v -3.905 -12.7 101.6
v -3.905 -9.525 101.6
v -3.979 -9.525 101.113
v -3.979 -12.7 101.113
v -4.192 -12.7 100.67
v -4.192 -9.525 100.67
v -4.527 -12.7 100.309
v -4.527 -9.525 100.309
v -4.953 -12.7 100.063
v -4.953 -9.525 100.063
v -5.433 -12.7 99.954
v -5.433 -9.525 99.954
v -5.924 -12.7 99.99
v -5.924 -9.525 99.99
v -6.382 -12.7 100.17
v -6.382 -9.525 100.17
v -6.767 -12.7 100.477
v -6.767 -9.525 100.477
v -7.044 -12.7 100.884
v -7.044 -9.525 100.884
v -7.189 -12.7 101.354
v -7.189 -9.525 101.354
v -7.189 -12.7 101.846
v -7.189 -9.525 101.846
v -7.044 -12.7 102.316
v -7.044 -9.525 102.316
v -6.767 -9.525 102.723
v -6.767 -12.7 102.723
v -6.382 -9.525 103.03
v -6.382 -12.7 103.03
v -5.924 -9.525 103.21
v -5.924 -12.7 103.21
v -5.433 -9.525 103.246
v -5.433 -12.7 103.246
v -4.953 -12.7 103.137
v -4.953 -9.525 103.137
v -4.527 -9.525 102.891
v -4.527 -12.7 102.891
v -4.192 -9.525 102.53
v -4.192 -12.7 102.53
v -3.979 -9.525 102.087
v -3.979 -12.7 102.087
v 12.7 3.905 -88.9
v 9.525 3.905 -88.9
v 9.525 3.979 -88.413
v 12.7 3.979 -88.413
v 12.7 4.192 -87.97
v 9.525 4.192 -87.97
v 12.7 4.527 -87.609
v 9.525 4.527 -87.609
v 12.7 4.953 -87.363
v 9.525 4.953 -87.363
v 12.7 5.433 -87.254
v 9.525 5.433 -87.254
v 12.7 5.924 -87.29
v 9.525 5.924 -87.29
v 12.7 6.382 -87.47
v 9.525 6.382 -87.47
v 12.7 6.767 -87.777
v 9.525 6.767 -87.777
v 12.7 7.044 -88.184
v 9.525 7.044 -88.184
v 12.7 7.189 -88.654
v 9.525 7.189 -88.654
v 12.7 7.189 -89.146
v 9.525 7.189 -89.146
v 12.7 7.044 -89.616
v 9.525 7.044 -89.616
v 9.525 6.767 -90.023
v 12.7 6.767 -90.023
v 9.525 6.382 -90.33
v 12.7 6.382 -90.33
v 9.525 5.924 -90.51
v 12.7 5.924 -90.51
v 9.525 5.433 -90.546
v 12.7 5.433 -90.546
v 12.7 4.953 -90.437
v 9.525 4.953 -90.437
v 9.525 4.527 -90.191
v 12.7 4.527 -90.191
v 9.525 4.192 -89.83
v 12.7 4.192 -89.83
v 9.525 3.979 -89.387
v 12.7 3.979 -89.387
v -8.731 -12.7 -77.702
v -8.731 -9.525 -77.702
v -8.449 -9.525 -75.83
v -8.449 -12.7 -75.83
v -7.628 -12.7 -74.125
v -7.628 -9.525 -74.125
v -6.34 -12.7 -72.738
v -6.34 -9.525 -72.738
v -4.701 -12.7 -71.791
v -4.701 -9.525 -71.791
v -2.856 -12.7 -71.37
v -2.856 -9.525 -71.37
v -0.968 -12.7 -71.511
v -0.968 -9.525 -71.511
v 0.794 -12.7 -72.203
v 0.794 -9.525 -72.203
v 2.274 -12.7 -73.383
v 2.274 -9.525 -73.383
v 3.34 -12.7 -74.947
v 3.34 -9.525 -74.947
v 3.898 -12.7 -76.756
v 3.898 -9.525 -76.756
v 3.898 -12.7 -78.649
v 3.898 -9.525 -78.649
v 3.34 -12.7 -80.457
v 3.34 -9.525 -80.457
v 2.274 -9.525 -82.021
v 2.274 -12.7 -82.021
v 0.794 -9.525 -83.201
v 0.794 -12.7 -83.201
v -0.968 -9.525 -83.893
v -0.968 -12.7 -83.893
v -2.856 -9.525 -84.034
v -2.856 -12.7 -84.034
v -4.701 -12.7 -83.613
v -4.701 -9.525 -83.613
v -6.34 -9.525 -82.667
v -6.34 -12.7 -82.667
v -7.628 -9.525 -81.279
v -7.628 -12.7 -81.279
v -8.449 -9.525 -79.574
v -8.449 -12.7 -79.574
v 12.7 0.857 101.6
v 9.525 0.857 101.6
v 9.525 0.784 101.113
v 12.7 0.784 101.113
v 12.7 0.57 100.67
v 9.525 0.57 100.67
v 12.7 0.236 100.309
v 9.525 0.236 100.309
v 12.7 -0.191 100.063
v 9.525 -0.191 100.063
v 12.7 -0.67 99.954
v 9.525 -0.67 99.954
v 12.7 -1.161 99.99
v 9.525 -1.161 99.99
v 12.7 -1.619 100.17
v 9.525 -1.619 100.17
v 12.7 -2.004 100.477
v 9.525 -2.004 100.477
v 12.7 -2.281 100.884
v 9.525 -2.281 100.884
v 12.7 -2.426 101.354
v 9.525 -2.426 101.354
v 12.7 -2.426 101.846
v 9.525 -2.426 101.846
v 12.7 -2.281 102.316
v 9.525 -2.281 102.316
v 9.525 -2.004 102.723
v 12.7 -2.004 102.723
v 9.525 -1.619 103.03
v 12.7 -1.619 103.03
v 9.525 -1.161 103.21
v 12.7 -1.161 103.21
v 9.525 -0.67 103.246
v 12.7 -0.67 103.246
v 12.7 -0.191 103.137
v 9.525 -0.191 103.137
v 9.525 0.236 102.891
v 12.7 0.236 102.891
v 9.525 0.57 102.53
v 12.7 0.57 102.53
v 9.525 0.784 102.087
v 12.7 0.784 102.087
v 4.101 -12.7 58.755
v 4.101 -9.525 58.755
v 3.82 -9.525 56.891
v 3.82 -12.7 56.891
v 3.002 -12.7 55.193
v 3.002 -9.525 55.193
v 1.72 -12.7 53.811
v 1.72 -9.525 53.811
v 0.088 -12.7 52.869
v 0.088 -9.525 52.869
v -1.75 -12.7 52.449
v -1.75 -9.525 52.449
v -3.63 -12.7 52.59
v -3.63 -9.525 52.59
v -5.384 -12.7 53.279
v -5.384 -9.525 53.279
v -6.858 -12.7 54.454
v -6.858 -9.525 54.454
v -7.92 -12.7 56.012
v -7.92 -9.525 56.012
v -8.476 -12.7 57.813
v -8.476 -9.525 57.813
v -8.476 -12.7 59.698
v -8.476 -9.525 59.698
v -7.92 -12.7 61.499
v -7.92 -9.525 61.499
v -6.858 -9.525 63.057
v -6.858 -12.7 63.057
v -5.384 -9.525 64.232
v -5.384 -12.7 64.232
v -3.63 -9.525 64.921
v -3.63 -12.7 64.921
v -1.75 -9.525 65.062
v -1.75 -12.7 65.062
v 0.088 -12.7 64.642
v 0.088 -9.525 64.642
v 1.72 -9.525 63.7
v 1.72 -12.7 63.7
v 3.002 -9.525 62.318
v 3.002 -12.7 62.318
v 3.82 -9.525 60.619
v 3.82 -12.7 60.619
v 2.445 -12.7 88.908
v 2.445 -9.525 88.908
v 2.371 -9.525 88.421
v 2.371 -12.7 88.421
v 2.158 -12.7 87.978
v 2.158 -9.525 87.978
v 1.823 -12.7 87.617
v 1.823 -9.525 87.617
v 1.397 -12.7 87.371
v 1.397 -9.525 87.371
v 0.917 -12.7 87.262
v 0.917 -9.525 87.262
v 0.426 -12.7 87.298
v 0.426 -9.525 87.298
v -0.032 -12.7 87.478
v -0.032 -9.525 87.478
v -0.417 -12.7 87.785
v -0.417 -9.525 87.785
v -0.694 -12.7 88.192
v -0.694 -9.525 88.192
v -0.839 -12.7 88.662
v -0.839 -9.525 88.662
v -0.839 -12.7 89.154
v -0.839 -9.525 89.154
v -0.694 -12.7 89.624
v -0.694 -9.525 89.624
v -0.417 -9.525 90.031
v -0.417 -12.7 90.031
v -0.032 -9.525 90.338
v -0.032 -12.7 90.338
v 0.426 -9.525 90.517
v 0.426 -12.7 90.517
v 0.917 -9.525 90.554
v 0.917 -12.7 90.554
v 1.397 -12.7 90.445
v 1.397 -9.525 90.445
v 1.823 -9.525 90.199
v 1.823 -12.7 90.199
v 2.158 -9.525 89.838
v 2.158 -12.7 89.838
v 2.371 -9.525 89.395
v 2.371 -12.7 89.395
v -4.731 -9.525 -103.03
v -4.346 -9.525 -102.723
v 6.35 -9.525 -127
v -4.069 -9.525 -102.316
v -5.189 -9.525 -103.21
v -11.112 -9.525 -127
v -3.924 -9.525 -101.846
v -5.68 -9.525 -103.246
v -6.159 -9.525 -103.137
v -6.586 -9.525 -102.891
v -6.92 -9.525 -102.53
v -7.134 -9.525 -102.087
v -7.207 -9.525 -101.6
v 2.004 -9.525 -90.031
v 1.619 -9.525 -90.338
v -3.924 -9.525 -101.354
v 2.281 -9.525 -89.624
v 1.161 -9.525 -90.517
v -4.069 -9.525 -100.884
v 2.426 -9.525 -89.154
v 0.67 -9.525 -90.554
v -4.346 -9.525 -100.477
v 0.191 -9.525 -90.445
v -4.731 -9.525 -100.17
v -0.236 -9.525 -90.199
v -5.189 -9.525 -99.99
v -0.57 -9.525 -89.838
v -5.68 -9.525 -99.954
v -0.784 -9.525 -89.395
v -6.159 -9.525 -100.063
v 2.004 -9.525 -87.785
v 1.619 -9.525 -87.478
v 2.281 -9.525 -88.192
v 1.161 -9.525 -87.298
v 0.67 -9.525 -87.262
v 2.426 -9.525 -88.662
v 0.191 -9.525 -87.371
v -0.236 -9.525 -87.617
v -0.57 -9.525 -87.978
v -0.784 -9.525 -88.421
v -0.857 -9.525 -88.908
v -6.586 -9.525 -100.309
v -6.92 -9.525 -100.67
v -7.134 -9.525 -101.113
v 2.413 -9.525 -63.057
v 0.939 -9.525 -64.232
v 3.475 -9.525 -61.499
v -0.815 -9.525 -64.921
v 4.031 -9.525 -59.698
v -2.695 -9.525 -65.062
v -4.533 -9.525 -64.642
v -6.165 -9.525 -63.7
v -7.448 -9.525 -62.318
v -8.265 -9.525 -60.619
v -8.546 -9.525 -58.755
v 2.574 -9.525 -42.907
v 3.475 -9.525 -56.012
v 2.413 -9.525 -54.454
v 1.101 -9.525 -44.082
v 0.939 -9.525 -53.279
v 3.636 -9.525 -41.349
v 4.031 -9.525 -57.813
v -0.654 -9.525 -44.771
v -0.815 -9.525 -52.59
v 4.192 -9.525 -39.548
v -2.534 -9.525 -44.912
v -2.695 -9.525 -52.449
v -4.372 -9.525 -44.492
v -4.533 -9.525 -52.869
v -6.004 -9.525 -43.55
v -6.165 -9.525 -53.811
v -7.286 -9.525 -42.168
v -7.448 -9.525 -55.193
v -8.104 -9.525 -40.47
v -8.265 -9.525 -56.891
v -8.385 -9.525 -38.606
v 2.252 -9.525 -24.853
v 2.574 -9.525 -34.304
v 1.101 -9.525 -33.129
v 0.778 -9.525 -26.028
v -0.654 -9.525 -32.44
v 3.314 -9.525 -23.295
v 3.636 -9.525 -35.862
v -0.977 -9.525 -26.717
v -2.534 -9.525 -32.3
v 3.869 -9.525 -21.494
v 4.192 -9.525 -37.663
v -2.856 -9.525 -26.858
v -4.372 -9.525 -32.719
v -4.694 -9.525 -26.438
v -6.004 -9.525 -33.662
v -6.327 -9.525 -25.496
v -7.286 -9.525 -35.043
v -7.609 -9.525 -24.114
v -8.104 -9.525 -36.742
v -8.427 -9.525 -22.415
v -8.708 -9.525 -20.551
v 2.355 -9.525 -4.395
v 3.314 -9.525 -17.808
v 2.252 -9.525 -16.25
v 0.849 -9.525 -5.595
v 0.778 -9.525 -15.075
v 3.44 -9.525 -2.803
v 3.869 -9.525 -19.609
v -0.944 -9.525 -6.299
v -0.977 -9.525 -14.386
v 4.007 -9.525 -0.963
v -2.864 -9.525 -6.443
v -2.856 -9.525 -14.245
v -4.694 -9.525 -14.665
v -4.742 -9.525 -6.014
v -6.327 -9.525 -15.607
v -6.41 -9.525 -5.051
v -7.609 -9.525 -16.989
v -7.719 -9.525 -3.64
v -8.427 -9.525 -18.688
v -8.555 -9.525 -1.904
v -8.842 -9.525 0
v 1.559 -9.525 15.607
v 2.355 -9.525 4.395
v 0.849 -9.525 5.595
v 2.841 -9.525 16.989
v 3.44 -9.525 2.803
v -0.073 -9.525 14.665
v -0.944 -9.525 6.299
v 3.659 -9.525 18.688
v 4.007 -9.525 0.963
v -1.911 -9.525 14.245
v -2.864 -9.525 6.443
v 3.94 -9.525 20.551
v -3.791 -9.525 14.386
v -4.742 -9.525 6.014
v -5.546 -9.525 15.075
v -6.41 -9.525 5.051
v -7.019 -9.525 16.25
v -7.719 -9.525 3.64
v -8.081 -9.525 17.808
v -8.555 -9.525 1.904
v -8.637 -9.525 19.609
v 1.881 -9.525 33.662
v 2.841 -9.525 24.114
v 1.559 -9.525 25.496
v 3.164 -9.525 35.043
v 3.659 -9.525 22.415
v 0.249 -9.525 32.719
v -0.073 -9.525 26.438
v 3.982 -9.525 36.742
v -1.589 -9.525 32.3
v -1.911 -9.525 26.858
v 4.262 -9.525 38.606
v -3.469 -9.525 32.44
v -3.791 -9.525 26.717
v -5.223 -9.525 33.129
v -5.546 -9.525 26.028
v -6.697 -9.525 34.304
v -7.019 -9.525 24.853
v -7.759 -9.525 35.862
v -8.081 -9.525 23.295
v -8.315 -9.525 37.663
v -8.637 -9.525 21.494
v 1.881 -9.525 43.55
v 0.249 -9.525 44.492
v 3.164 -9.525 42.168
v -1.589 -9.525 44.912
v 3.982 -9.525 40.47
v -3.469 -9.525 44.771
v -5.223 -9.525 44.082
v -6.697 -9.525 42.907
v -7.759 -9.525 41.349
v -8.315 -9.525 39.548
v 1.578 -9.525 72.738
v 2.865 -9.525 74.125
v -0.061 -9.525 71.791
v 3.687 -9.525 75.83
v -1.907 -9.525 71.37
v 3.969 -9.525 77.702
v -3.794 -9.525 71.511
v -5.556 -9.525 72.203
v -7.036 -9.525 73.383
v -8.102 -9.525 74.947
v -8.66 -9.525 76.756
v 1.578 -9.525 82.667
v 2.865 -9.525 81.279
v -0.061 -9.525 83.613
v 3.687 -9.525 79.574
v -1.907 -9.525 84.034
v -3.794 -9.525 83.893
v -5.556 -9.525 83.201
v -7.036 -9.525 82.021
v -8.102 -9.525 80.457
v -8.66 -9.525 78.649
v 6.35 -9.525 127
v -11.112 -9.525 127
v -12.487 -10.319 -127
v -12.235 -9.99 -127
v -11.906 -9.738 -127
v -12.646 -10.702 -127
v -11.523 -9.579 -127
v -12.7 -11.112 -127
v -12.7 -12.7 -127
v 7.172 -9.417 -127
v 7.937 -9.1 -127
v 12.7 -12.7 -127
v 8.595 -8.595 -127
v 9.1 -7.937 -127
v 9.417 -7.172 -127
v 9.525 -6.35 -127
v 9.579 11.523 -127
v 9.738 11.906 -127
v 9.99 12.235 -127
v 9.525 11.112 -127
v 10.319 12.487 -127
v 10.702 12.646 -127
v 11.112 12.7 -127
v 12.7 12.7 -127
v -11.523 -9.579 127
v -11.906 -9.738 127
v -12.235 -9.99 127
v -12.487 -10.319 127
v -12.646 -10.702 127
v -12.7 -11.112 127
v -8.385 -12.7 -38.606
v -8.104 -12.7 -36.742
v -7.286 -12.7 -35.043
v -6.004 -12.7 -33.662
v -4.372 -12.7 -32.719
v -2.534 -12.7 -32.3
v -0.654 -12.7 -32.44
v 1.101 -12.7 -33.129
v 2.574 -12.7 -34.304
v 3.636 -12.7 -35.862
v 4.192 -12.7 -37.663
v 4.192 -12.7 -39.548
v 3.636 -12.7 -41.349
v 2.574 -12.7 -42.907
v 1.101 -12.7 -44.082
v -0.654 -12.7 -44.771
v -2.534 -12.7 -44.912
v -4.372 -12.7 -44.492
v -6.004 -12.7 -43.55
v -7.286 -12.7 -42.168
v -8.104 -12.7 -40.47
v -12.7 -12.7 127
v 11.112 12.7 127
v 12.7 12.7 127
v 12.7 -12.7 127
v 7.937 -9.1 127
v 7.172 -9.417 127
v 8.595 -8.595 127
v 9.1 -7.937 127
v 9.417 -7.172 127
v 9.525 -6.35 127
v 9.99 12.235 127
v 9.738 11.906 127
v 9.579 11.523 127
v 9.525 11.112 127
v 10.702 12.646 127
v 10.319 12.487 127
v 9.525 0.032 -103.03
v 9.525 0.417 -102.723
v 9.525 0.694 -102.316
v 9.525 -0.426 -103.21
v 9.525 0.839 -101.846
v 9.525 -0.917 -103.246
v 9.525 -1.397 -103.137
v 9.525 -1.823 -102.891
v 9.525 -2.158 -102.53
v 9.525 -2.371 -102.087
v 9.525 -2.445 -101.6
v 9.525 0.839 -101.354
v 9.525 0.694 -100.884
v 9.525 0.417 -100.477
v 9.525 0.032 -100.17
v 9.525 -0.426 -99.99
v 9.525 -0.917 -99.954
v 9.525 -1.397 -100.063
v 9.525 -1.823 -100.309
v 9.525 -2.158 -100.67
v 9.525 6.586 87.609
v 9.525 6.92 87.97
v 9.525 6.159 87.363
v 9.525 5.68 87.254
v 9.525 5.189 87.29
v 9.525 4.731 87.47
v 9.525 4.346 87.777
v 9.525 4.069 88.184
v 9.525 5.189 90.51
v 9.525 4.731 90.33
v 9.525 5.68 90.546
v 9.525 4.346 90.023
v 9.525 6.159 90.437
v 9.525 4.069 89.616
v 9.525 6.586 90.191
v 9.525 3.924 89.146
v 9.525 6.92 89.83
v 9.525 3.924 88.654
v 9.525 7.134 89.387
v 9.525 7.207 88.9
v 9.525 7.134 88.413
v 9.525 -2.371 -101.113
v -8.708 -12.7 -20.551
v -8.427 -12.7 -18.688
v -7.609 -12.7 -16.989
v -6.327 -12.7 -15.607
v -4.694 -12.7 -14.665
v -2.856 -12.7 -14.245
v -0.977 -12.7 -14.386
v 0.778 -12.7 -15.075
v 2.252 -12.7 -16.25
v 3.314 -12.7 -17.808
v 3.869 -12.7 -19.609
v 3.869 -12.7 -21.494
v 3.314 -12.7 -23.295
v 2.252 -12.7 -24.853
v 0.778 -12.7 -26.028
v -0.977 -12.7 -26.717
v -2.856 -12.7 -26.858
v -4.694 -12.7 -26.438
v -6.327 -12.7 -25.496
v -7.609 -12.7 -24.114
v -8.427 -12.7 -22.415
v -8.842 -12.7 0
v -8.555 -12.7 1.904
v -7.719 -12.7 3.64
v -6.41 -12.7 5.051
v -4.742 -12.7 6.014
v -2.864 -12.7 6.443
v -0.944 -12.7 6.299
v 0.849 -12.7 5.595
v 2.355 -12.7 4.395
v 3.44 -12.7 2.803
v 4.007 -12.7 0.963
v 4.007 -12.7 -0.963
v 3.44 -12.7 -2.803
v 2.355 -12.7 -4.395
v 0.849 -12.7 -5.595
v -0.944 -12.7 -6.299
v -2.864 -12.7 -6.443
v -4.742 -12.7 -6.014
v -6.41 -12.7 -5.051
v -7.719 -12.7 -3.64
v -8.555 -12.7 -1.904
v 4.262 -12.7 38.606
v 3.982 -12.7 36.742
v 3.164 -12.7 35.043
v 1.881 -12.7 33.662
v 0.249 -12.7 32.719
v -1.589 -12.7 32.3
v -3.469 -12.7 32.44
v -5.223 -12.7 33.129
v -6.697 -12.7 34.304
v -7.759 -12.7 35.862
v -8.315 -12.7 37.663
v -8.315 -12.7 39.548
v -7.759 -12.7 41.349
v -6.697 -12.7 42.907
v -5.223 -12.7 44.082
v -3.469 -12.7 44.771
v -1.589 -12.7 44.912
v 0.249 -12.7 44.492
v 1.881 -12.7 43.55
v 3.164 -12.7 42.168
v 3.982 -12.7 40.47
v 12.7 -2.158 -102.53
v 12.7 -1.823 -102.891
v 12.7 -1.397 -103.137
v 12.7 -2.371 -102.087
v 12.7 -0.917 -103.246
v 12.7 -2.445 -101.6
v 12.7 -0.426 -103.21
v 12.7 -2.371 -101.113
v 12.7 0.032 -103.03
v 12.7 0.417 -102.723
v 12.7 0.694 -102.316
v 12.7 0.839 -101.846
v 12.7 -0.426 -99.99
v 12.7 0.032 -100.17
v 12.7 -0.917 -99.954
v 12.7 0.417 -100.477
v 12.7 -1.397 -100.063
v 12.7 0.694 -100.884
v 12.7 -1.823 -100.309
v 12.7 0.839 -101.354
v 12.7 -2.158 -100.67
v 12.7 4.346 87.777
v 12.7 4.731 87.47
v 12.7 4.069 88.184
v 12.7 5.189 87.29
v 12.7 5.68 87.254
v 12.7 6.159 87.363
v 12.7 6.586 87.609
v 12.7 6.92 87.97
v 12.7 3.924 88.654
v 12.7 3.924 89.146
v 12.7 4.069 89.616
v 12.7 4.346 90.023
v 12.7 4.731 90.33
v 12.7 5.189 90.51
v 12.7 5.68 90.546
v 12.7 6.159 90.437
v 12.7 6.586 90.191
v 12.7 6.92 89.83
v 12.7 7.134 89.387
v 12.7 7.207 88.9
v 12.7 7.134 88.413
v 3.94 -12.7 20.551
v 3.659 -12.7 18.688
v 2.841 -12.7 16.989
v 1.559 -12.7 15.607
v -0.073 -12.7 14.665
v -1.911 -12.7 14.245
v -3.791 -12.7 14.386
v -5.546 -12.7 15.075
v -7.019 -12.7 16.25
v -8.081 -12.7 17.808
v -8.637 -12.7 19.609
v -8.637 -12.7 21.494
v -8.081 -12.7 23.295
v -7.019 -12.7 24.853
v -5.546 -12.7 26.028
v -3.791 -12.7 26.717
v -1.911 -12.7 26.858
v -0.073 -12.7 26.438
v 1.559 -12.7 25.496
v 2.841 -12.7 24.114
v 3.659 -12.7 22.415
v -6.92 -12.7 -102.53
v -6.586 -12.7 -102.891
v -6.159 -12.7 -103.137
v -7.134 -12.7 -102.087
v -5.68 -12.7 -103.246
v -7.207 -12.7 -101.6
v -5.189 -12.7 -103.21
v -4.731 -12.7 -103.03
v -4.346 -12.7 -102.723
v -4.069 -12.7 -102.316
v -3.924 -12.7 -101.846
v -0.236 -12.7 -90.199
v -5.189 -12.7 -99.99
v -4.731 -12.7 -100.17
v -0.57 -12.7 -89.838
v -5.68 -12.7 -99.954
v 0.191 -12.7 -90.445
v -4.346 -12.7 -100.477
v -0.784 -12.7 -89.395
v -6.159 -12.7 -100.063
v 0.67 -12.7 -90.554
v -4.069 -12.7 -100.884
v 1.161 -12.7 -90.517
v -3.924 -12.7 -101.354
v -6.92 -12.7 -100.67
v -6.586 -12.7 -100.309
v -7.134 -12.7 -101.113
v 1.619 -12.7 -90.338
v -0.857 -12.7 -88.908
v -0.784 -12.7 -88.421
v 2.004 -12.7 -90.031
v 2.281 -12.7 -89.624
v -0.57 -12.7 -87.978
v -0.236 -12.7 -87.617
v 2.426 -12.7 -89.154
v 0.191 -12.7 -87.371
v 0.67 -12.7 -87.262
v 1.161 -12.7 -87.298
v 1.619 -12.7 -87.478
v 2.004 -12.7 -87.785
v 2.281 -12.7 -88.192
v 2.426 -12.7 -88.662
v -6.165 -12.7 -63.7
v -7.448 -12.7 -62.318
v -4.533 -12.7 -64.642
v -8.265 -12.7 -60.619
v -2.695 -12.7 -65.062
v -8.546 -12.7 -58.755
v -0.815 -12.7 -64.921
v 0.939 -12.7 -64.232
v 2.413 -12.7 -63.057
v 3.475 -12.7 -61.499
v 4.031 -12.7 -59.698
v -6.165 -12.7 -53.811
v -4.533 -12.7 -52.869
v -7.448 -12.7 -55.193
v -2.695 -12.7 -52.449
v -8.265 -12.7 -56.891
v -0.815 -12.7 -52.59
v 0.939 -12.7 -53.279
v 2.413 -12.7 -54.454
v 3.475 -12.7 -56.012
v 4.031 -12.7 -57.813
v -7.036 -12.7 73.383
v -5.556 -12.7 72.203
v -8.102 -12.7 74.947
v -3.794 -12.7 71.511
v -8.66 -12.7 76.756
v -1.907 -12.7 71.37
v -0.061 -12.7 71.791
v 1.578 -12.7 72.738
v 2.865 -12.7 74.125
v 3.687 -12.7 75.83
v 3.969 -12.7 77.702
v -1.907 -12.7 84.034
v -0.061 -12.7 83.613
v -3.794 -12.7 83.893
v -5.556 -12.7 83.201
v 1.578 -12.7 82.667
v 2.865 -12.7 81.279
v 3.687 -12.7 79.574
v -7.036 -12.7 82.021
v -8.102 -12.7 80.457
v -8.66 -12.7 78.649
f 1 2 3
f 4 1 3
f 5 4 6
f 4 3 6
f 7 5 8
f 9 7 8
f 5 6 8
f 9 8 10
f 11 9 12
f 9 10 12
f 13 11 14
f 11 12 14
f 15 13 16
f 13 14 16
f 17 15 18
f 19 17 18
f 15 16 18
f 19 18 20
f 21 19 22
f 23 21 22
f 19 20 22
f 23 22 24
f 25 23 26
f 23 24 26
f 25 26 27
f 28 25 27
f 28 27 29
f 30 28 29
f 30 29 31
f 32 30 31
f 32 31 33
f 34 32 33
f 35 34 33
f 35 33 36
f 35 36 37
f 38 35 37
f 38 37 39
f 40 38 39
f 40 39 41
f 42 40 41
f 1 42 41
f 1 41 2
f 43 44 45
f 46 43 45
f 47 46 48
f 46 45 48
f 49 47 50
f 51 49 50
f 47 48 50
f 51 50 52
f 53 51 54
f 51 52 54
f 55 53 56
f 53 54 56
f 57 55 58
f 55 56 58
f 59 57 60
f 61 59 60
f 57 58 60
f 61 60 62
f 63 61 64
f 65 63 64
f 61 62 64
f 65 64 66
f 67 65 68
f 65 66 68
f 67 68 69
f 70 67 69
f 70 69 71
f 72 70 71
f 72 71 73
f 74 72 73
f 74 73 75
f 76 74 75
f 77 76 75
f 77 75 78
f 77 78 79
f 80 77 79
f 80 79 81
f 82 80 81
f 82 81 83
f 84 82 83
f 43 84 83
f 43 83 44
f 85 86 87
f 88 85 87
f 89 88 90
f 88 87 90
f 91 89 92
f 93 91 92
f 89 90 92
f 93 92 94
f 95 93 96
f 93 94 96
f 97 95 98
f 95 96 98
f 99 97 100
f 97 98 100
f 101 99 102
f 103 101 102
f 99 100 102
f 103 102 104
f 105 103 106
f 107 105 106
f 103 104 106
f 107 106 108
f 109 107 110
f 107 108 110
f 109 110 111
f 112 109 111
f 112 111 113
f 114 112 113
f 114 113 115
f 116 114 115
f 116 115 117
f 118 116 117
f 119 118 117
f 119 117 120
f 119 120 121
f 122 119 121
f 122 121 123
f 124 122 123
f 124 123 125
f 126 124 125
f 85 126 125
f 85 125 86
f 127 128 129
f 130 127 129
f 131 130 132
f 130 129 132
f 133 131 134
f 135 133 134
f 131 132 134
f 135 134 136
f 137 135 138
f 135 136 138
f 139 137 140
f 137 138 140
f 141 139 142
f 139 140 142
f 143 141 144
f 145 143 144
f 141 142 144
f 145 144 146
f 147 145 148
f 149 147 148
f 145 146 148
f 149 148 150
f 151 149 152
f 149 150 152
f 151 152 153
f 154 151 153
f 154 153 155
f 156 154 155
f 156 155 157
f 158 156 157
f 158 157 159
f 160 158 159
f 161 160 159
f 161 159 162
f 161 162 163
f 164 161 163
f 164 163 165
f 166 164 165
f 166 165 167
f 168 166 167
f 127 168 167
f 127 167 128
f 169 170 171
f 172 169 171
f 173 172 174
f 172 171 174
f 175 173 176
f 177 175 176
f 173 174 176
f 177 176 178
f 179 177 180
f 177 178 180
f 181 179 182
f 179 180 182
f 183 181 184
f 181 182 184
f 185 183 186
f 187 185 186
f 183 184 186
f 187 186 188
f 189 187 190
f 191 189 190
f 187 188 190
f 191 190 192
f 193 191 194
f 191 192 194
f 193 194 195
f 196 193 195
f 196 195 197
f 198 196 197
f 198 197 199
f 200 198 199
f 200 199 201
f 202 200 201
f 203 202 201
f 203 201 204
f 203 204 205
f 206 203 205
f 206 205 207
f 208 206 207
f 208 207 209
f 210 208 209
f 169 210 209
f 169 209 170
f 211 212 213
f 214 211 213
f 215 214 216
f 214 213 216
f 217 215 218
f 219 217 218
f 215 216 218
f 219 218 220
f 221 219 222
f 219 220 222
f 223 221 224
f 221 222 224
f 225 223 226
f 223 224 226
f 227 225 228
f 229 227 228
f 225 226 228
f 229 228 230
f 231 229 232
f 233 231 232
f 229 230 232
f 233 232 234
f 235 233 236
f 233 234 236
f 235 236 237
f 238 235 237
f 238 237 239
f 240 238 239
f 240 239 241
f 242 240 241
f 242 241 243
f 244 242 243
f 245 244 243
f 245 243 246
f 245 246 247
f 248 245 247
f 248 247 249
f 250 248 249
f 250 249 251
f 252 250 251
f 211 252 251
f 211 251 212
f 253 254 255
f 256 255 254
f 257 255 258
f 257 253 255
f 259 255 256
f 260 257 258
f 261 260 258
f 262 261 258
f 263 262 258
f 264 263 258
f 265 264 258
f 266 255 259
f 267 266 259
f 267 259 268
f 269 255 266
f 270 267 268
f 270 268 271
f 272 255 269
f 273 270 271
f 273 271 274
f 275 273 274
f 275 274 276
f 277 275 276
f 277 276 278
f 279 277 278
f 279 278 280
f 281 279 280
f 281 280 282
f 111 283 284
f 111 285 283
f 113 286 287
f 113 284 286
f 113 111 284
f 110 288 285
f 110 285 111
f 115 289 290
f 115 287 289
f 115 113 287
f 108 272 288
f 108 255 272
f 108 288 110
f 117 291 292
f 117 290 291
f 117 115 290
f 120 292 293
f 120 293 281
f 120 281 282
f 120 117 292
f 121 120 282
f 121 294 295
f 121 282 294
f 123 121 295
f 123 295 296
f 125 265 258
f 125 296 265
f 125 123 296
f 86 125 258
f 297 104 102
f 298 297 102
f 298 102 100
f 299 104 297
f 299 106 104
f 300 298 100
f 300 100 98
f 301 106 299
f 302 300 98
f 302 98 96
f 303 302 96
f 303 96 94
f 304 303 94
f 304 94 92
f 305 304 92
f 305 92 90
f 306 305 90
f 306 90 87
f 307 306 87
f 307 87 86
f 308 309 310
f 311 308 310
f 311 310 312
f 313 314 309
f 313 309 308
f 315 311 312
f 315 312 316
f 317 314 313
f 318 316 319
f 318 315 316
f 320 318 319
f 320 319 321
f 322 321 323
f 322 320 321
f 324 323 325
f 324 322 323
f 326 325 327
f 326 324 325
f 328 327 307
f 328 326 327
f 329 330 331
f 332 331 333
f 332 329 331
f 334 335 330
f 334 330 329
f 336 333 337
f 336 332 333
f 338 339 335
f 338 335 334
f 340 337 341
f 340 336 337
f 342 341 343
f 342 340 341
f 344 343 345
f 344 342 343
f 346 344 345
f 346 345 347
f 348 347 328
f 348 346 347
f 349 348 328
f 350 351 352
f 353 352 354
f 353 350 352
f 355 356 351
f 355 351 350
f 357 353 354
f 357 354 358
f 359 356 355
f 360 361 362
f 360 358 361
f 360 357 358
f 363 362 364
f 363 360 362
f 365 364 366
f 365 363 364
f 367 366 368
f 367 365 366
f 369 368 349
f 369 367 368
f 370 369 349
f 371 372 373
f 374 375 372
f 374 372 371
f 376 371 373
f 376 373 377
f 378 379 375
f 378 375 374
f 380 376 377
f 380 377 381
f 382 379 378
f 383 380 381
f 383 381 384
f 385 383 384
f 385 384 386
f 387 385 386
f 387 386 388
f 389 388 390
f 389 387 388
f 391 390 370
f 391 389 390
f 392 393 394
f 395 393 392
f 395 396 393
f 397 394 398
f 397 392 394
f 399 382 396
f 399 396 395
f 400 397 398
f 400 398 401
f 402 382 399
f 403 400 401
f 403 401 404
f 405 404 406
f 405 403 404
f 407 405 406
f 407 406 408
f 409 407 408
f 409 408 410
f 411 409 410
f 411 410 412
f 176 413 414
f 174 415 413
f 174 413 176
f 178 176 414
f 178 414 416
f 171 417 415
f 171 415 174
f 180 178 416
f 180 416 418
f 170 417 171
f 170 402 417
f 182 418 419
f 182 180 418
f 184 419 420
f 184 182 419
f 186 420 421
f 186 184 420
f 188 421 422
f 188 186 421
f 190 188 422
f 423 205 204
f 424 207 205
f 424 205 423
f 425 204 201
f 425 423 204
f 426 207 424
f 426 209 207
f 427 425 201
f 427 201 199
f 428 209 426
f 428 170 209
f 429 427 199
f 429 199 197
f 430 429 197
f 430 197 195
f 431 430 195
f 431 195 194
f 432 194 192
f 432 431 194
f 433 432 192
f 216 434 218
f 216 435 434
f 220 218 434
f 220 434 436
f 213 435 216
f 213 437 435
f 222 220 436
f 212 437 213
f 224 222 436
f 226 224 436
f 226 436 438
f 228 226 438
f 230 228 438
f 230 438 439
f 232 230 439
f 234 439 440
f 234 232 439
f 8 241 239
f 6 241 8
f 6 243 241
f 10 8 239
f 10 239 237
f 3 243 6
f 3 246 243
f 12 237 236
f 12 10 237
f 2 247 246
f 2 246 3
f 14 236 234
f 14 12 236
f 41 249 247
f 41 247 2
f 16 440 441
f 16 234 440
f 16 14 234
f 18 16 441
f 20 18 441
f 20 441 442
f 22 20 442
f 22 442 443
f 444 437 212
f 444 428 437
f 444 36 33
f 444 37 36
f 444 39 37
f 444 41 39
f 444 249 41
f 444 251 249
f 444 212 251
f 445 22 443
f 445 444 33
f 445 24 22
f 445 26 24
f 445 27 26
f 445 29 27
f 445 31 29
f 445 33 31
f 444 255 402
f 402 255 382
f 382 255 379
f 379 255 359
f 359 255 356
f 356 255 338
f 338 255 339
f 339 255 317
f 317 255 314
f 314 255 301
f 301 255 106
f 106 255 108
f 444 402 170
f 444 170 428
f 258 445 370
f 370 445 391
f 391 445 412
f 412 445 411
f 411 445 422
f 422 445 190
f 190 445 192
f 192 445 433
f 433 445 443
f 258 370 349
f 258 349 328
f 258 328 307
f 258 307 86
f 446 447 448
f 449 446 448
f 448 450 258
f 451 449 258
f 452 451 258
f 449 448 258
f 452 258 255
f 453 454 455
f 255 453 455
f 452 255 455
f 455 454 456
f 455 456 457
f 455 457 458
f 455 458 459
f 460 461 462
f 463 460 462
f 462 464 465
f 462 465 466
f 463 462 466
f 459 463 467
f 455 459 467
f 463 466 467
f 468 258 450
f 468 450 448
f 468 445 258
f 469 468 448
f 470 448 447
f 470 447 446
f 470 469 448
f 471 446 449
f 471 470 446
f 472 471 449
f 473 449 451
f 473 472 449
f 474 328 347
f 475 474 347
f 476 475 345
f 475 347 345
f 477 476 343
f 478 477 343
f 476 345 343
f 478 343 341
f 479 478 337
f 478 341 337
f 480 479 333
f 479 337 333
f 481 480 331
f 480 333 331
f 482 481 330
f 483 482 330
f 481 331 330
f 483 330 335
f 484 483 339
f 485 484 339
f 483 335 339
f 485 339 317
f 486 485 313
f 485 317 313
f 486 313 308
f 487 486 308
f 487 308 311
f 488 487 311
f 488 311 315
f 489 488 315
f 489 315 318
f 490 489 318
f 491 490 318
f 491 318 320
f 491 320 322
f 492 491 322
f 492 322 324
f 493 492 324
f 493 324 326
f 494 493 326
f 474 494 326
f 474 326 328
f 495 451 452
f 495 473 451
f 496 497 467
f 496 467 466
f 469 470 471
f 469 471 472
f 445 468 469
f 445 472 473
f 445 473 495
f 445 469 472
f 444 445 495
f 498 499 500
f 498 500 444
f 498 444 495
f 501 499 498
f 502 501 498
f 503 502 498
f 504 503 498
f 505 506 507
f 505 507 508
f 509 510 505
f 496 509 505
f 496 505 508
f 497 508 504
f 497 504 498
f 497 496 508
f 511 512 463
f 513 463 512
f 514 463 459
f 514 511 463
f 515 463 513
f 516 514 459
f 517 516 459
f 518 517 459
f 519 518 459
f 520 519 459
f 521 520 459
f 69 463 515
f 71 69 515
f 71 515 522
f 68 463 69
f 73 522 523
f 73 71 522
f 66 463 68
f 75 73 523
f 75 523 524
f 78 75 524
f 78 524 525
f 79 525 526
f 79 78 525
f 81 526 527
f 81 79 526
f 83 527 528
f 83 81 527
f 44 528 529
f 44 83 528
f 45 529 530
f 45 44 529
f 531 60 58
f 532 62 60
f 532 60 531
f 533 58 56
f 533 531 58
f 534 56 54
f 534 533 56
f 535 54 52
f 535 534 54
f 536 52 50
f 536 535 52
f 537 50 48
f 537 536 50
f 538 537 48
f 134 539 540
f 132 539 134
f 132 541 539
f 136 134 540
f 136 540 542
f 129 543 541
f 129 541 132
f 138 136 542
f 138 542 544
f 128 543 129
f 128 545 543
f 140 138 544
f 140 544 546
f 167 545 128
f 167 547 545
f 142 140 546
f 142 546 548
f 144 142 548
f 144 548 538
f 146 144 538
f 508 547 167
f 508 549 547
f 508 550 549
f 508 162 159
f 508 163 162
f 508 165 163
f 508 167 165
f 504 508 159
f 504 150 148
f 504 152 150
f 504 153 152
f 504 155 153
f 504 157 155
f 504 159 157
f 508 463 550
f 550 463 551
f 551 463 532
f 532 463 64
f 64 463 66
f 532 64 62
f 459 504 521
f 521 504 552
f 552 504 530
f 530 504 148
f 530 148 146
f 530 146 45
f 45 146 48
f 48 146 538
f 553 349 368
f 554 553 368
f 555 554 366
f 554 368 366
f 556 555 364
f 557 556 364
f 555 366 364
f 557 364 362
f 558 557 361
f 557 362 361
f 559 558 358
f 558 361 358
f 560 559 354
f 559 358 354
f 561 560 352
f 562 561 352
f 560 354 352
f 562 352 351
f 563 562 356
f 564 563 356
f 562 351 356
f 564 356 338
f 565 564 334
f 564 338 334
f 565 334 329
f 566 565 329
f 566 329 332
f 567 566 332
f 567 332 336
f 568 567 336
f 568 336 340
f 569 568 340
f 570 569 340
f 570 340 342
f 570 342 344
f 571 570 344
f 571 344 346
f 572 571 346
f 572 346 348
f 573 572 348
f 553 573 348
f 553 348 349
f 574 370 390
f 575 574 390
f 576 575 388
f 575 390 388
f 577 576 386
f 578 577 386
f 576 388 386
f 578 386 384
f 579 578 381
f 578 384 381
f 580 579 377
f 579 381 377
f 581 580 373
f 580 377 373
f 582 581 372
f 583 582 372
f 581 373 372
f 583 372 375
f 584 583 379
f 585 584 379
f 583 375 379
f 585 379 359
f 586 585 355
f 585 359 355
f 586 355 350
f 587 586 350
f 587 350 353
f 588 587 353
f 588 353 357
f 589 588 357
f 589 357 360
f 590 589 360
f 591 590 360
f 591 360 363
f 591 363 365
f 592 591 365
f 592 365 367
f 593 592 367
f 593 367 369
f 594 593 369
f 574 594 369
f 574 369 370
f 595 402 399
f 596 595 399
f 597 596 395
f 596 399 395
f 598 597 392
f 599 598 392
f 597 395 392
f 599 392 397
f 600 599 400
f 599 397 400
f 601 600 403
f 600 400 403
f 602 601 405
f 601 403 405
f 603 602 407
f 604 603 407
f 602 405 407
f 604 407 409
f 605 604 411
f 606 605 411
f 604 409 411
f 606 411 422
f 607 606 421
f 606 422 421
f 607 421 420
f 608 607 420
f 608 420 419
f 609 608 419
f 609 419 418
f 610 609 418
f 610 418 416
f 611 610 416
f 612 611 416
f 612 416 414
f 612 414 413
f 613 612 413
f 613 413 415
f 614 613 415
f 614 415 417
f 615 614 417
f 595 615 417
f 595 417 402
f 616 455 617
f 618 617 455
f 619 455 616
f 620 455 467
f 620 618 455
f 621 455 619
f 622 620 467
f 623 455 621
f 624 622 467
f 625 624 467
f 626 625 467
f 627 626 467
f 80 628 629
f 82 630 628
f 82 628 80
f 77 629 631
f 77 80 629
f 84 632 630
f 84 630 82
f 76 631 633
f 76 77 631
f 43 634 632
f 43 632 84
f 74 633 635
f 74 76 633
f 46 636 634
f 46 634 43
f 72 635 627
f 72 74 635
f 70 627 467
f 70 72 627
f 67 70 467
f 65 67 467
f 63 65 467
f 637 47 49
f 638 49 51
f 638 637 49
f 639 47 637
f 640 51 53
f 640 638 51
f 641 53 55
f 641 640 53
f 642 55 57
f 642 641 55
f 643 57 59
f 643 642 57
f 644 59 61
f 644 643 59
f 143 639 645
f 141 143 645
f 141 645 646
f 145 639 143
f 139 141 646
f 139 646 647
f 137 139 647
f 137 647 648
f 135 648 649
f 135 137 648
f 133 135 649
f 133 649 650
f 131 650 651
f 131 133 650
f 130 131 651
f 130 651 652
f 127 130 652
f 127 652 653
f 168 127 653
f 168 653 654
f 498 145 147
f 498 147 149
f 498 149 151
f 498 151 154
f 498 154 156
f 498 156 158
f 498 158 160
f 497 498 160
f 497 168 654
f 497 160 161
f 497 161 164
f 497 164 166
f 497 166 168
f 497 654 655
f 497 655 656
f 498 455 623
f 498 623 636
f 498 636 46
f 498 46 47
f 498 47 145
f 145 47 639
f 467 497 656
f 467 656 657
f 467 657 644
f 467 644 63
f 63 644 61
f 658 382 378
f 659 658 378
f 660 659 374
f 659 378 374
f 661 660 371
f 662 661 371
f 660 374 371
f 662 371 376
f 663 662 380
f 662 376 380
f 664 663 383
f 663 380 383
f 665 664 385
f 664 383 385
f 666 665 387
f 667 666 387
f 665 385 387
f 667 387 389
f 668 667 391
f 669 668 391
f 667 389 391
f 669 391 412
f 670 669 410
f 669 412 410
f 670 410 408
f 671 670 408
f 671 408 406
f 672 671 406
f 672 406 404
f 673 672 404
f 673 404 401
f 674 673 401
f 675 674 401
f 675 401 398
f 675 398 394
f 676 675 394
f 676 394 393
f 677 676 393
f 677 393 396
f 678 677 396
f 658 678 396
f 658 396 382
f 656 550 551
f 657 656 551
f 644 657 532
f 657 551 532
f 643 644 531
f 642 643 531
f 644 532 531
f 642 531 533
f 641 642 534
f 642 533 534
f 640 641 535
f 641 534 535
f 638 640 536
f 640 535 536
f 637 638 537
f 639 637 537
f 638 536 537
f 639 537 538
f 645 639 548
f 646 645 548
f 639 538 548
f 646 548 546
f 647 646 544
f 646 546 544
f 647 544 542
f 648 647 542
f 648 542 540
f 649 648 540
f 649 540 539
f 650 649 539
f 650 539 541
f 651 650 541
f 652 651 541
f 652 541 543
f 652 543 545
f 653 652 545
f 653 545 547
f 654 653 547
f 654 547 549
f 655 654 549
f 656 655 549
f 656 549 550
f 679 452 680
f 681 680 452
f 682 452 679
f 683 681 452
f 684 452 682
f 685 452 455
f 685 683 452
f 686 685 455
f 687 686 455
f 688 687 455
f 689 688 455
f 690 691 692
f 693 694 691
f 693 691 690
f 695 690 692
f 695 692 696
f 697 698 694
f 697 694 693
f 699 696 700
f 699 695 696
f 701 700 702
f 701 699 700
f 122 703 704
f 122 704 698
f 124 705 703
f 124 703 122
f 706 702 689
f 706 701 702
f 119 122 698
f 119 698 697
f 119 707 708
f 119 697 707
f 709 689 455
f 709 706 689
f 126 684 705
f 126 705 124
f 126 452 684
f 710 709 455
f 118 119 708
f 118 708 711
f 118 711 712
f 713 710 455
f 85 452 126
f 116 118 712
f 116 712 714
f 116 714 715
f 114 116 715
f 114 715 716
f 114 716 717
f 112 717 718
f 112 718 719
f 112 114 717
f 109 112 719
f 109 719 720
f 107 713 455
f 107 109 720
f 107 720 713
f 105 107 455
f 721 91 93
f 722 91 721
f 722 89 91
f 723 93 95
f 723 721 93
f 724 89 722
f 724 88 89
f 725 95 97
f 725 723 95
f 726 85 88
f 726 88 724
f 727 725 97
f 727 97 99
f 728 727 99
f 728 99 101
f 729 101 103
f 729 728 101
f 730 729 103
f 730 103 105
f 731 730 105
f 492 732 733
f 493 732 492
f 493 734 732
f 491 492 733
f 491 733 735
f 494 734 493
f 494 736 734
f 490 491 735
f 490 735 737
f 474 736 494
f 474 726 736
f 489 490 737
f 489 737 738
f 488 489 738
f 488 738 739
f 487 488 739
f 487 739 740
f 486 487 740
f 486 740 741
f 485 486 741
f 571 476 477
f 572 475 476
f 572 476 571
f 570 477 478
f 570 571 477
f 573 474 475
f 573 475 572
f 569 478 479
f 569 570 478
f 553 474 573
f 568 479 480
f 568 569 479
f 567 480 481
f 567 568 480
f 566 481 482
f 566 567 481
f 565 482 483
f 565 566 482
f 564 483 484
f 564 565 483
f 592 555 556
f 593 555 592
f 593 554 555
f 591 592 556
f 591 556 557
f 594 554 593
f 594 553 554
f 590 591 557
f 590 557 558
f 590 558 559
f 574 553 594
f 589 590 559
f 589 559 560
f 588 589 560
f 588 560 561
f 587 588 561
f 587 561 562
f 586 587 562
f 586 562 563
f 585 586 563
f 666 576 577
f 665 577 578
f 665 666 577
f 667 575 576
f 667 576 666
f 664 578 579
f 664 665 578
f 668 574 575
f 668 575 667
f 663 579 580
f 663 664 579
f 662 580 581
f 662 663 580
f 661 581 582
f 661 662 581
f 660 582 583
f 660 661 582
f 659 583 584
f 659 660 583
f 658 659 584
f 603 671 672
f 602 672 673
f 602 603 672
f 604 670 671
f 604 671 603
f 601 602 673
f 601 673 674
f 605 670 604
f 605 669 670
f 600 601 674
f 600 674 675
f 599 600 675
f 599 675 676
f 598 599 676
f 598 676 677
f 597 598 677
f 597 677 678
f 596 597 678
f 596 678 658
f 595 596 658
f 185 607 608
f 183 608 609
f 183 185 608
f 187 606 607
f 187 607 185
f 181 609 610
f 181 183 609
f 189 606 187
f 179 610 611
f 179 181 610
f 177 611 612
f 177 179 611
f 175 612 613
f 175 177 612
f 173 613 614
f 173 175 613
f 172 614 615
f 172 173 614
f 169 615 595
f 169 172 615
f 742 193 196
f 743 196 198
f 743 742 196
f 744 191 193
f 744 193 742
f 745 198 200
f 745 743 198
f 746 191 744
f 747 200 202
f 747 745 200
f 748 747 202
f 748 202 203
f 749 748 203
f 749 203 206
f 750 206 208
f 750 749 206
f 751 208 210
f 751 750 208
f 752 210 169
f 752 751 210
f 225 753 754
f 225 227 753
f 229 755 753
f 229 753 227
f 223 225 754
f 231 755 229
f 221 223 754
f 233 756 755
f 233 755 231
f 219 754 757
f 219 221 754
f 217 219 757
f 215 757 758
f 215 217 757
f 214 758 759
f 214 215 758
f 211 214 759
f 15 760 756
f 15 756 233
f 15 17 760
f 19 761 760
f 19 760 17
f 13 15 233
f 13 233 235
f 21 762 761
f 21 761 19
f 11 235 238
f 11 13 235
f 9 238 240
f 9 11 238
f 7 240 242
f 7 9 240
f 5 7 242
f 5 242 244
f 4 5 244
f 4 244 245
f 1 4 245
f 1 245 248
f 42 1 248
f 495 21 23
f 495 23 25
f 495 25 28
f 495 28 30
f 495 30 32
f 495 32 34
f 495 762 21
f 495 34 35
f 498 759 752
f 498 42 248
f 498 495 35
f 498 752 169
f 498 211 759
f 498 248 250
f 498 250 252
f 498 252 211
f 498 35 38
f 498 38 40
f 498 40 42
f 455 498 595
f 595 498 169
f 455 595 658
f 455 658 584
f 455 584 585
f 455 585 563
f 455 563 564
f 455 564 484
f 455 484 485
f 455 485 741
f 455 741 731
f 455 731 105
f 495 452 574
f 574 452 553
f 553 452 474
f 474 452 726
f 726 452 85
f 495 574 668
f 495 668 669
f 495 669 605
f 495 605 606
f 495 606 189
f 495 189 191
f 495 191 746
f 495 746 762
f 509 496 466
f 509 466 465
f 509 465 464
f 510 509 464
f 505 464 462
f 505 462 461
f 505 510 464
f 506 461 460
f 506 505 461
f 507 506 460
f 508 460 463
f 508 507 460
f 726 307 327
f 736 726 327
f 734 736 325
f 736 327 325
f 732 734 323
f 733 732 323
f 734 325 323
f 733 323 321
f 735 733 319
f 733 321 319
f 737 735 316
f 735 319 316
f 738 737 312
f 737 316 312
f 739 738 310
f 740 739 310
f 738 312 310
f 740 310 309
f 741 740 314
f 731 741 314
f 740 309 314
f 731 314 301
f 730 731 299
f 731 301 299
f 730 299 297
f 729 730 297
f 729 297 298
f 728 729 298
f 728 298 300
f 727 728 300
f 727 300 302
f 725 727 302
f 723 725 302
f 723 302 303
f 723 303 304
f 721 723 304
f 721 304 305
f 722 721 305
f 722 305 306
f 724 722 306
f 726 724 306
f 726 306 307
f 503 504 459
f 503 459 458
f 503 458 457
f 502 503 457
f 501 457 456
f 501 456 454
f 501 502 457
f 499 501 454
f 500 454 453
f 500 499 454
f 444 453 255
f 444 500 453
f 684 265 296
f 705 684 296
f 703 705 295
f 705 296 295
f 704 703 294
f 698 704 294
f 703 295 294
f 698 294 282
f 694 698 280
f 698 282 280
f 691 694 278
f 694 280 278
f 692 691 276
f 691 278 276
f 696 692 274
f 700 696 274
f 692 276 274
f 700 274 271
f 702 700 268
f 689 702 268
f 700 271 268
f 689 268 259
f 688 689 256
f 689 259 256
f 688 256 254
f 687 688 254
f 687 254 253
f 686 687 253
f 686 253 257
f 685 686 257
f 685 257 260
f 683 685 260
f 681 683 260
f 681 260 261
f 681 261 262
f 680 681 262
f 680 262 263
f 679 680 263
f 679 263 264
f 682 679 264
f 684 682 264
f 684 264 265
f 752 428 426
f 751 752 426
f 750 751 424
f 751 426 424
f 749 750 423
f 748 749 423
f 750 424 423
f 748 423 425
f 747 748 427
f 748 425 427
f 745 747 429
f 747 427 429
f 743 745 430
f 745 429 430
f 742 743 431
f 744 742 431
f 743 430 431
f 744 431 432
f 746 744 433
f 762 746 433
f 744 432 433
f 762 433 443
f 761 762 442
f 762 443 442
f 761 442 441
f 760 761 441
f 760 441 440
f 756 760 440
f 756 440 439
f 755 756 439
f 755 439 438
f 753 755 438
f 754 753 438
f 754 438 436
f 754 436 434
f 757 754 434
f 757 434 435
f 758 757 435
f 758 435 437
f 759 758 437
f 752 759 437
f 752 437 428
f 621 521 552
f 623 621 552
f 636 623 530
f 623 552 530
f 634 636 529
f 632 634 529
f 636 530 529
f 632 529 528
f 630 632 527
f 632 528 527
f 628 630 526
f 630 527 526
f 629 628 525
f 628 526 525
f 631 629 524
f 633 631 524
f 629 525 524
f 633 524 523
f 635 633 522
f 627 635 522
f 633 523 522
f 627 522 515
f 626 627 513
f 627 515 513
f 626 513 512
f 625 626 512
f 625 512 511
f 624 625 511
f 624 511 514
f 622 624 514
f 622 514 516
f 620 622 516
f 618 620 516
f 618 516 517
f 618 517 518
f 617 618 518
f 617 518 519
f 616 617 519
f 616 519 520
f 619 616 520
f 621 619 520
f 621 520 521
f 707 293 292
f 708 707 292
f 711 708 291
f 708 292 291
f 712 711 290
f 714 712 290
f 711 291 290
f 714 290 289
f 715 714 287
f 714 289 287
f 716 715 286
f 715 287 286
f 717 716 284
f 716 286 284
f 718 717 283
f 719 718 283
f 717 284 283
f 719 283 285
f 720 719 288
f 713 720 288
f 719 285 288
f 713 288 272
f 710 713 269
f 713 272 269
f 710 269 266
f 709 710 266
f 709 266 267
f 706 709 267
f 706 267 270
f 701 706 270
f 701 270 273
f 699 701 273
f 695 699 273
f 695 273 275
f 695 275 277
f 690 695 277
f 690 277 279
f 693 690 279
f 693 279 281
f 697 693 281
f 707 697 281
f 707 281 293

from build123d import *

# Parameters (mm, degrees)
BOSS_EXTRUDE1_DEPTH = 127
SKETCH4_R           = 1.651
CUT_EXTRUDE1_DEPTH  = 130.554006596
SKETCH5_R           = 1.651
CUT_EXTRUDE2_DEPTH  = 130.554006596
SKETCH4_5_R         = 1.651
SKETCH4_5_R_2       = 6.35
SKETCH4_5_R_3       = 6.323800798
SKETCH4_5_R_4       = 6.460876205
CUT_EXTRUDE3_DEPTH  = 130.554006596


with BuildPart() as part:
    # Sketch2 → Boss-Extrude1 (new, symmetric)
    with BuildSketch(Plane.XY):
        with BuildLine():
            Line((-12.7, -12.7), (12.7, -12.7))
            Line((12.7, -12.7), (12.7, 12.7))
            Line((12.7, 12.7), (11.1125, 12.7))
            ThreePointArc((11.1125, 12.7), (9.989967985, 12.235032015), (9.525, 11.1125))
            Line((9.525, 11.1125), (9.525, -6.35))
            ThreePointArc((9.525, -6.35), (8.59506403, -8.59506403), (6.35, -9.525))
            Line((6.35, -9.525), (-11.1125, -9.525))
            ThreePointArc((-11.1125, -9.525), (-12.235032015, -9.989967985), (-12.7, -11.1125))
            Line((-12.7, -11.1125), (-12.7, -12.7))
        make_face()
    extrude(amount=BOSS_EXTRUDE1_DEPTH, both=True)

    # Sketch4 → Cut-Extrude1 (cut, through all)
    with BuildSketch(Plane(origin=(0, -9.525, 0), x_dir=(1, 0, 0), z_dir=(0, 1, 0))):
        with Locations((-5.55625, 101.6)):
            Circle(SKETCH4_R)
        with Locations((0.79375, 88.907891862)):
            Circle(SKETCH4_R)
        with Locations((0.79375, -88.907891862)):
            Circle(SKETCH4_R)
        with Locations((-5.55625, -101.6)):
            Circle(SKETCH4_R)
    extrude(amount=-CUT_EXTRUDE1_DEPTH, mode=Mode.SUBTRACT)

    # Sketch5 → Cut-Extrude2 (cut, through all)
    with BuildSketch(Plane.ZY.offset(-9.525)):
        with Locations((-88.9, 5.55625)):
            Circle(SKETCH5_R)
        with Locations((-101.6, -0.79375)):
            Circle(SKETCH5_R)
        with Locations((88.9, 5.55625)):
            Circle(SKETCH5_R)
        with Locations((101.6, -0.79375)):
            Circle(SKETCH5_R)
    extrude(amount=-CUT_EXTRUDE2_DEPTH, mode=Mode.SUBTRACT)

    # Sketch4<5> → Cut-Extrude3 (cut, through all)
    with BuildSketch(Plane(origin=(0, -9.525, 0), x_dir=(1, 0, 0), z_dir=(0, 1, 0))):
        with Locations((-5.55625, 101.6)):
            Circle(SKETCH4_5_R)
        with Locations((0.79375, 88.907891862)):
            Circle(SKETCH4_5_R)
        with Locations((0.79375, -88.907891862)):
            Circle(SKETCH4_5_R)
        with Locations((-5.55625, -101.6)):
            Circle(SKETCH4_5_R)
        with Locations((-2.38125, 77.702134885)):
            Circle(SKETCH4_5_R_2)
        with Locations((-2.222550137, 58.755442455)):
            Circle(SKETCH4_5_R_3)
        with Locations((-2.061352022, 38.605678066)):
            Circle(SKETCH4_5_R_3)
        with Locations((-2.383748252, 20.551489173)):
            Circle(SKETCH4_5_R_3)
        with Locations((-2.38125, 0)):
            Circle(SKETCH4_5_R_4)
        with Locations((-2.061352022, -38.605678066)):
            Circle(SKETCH4_5_R_3)
        with Locations((-2.383748252, -20.551489173)):
            Circle(SKETCH4_5_R_3)
        with Locations((-2.222550137, -58.755442455)):
            Circle(SKETCH4_5_R_3)
        with Locations((-2.38125, -77.702134885)):
            Circle(SKETCH4_5_R_2)
    extrude(amount=-CUT_EXTRUDE3_DEPTH, mode=Mode.SUBTRACT)


solid = part.part
